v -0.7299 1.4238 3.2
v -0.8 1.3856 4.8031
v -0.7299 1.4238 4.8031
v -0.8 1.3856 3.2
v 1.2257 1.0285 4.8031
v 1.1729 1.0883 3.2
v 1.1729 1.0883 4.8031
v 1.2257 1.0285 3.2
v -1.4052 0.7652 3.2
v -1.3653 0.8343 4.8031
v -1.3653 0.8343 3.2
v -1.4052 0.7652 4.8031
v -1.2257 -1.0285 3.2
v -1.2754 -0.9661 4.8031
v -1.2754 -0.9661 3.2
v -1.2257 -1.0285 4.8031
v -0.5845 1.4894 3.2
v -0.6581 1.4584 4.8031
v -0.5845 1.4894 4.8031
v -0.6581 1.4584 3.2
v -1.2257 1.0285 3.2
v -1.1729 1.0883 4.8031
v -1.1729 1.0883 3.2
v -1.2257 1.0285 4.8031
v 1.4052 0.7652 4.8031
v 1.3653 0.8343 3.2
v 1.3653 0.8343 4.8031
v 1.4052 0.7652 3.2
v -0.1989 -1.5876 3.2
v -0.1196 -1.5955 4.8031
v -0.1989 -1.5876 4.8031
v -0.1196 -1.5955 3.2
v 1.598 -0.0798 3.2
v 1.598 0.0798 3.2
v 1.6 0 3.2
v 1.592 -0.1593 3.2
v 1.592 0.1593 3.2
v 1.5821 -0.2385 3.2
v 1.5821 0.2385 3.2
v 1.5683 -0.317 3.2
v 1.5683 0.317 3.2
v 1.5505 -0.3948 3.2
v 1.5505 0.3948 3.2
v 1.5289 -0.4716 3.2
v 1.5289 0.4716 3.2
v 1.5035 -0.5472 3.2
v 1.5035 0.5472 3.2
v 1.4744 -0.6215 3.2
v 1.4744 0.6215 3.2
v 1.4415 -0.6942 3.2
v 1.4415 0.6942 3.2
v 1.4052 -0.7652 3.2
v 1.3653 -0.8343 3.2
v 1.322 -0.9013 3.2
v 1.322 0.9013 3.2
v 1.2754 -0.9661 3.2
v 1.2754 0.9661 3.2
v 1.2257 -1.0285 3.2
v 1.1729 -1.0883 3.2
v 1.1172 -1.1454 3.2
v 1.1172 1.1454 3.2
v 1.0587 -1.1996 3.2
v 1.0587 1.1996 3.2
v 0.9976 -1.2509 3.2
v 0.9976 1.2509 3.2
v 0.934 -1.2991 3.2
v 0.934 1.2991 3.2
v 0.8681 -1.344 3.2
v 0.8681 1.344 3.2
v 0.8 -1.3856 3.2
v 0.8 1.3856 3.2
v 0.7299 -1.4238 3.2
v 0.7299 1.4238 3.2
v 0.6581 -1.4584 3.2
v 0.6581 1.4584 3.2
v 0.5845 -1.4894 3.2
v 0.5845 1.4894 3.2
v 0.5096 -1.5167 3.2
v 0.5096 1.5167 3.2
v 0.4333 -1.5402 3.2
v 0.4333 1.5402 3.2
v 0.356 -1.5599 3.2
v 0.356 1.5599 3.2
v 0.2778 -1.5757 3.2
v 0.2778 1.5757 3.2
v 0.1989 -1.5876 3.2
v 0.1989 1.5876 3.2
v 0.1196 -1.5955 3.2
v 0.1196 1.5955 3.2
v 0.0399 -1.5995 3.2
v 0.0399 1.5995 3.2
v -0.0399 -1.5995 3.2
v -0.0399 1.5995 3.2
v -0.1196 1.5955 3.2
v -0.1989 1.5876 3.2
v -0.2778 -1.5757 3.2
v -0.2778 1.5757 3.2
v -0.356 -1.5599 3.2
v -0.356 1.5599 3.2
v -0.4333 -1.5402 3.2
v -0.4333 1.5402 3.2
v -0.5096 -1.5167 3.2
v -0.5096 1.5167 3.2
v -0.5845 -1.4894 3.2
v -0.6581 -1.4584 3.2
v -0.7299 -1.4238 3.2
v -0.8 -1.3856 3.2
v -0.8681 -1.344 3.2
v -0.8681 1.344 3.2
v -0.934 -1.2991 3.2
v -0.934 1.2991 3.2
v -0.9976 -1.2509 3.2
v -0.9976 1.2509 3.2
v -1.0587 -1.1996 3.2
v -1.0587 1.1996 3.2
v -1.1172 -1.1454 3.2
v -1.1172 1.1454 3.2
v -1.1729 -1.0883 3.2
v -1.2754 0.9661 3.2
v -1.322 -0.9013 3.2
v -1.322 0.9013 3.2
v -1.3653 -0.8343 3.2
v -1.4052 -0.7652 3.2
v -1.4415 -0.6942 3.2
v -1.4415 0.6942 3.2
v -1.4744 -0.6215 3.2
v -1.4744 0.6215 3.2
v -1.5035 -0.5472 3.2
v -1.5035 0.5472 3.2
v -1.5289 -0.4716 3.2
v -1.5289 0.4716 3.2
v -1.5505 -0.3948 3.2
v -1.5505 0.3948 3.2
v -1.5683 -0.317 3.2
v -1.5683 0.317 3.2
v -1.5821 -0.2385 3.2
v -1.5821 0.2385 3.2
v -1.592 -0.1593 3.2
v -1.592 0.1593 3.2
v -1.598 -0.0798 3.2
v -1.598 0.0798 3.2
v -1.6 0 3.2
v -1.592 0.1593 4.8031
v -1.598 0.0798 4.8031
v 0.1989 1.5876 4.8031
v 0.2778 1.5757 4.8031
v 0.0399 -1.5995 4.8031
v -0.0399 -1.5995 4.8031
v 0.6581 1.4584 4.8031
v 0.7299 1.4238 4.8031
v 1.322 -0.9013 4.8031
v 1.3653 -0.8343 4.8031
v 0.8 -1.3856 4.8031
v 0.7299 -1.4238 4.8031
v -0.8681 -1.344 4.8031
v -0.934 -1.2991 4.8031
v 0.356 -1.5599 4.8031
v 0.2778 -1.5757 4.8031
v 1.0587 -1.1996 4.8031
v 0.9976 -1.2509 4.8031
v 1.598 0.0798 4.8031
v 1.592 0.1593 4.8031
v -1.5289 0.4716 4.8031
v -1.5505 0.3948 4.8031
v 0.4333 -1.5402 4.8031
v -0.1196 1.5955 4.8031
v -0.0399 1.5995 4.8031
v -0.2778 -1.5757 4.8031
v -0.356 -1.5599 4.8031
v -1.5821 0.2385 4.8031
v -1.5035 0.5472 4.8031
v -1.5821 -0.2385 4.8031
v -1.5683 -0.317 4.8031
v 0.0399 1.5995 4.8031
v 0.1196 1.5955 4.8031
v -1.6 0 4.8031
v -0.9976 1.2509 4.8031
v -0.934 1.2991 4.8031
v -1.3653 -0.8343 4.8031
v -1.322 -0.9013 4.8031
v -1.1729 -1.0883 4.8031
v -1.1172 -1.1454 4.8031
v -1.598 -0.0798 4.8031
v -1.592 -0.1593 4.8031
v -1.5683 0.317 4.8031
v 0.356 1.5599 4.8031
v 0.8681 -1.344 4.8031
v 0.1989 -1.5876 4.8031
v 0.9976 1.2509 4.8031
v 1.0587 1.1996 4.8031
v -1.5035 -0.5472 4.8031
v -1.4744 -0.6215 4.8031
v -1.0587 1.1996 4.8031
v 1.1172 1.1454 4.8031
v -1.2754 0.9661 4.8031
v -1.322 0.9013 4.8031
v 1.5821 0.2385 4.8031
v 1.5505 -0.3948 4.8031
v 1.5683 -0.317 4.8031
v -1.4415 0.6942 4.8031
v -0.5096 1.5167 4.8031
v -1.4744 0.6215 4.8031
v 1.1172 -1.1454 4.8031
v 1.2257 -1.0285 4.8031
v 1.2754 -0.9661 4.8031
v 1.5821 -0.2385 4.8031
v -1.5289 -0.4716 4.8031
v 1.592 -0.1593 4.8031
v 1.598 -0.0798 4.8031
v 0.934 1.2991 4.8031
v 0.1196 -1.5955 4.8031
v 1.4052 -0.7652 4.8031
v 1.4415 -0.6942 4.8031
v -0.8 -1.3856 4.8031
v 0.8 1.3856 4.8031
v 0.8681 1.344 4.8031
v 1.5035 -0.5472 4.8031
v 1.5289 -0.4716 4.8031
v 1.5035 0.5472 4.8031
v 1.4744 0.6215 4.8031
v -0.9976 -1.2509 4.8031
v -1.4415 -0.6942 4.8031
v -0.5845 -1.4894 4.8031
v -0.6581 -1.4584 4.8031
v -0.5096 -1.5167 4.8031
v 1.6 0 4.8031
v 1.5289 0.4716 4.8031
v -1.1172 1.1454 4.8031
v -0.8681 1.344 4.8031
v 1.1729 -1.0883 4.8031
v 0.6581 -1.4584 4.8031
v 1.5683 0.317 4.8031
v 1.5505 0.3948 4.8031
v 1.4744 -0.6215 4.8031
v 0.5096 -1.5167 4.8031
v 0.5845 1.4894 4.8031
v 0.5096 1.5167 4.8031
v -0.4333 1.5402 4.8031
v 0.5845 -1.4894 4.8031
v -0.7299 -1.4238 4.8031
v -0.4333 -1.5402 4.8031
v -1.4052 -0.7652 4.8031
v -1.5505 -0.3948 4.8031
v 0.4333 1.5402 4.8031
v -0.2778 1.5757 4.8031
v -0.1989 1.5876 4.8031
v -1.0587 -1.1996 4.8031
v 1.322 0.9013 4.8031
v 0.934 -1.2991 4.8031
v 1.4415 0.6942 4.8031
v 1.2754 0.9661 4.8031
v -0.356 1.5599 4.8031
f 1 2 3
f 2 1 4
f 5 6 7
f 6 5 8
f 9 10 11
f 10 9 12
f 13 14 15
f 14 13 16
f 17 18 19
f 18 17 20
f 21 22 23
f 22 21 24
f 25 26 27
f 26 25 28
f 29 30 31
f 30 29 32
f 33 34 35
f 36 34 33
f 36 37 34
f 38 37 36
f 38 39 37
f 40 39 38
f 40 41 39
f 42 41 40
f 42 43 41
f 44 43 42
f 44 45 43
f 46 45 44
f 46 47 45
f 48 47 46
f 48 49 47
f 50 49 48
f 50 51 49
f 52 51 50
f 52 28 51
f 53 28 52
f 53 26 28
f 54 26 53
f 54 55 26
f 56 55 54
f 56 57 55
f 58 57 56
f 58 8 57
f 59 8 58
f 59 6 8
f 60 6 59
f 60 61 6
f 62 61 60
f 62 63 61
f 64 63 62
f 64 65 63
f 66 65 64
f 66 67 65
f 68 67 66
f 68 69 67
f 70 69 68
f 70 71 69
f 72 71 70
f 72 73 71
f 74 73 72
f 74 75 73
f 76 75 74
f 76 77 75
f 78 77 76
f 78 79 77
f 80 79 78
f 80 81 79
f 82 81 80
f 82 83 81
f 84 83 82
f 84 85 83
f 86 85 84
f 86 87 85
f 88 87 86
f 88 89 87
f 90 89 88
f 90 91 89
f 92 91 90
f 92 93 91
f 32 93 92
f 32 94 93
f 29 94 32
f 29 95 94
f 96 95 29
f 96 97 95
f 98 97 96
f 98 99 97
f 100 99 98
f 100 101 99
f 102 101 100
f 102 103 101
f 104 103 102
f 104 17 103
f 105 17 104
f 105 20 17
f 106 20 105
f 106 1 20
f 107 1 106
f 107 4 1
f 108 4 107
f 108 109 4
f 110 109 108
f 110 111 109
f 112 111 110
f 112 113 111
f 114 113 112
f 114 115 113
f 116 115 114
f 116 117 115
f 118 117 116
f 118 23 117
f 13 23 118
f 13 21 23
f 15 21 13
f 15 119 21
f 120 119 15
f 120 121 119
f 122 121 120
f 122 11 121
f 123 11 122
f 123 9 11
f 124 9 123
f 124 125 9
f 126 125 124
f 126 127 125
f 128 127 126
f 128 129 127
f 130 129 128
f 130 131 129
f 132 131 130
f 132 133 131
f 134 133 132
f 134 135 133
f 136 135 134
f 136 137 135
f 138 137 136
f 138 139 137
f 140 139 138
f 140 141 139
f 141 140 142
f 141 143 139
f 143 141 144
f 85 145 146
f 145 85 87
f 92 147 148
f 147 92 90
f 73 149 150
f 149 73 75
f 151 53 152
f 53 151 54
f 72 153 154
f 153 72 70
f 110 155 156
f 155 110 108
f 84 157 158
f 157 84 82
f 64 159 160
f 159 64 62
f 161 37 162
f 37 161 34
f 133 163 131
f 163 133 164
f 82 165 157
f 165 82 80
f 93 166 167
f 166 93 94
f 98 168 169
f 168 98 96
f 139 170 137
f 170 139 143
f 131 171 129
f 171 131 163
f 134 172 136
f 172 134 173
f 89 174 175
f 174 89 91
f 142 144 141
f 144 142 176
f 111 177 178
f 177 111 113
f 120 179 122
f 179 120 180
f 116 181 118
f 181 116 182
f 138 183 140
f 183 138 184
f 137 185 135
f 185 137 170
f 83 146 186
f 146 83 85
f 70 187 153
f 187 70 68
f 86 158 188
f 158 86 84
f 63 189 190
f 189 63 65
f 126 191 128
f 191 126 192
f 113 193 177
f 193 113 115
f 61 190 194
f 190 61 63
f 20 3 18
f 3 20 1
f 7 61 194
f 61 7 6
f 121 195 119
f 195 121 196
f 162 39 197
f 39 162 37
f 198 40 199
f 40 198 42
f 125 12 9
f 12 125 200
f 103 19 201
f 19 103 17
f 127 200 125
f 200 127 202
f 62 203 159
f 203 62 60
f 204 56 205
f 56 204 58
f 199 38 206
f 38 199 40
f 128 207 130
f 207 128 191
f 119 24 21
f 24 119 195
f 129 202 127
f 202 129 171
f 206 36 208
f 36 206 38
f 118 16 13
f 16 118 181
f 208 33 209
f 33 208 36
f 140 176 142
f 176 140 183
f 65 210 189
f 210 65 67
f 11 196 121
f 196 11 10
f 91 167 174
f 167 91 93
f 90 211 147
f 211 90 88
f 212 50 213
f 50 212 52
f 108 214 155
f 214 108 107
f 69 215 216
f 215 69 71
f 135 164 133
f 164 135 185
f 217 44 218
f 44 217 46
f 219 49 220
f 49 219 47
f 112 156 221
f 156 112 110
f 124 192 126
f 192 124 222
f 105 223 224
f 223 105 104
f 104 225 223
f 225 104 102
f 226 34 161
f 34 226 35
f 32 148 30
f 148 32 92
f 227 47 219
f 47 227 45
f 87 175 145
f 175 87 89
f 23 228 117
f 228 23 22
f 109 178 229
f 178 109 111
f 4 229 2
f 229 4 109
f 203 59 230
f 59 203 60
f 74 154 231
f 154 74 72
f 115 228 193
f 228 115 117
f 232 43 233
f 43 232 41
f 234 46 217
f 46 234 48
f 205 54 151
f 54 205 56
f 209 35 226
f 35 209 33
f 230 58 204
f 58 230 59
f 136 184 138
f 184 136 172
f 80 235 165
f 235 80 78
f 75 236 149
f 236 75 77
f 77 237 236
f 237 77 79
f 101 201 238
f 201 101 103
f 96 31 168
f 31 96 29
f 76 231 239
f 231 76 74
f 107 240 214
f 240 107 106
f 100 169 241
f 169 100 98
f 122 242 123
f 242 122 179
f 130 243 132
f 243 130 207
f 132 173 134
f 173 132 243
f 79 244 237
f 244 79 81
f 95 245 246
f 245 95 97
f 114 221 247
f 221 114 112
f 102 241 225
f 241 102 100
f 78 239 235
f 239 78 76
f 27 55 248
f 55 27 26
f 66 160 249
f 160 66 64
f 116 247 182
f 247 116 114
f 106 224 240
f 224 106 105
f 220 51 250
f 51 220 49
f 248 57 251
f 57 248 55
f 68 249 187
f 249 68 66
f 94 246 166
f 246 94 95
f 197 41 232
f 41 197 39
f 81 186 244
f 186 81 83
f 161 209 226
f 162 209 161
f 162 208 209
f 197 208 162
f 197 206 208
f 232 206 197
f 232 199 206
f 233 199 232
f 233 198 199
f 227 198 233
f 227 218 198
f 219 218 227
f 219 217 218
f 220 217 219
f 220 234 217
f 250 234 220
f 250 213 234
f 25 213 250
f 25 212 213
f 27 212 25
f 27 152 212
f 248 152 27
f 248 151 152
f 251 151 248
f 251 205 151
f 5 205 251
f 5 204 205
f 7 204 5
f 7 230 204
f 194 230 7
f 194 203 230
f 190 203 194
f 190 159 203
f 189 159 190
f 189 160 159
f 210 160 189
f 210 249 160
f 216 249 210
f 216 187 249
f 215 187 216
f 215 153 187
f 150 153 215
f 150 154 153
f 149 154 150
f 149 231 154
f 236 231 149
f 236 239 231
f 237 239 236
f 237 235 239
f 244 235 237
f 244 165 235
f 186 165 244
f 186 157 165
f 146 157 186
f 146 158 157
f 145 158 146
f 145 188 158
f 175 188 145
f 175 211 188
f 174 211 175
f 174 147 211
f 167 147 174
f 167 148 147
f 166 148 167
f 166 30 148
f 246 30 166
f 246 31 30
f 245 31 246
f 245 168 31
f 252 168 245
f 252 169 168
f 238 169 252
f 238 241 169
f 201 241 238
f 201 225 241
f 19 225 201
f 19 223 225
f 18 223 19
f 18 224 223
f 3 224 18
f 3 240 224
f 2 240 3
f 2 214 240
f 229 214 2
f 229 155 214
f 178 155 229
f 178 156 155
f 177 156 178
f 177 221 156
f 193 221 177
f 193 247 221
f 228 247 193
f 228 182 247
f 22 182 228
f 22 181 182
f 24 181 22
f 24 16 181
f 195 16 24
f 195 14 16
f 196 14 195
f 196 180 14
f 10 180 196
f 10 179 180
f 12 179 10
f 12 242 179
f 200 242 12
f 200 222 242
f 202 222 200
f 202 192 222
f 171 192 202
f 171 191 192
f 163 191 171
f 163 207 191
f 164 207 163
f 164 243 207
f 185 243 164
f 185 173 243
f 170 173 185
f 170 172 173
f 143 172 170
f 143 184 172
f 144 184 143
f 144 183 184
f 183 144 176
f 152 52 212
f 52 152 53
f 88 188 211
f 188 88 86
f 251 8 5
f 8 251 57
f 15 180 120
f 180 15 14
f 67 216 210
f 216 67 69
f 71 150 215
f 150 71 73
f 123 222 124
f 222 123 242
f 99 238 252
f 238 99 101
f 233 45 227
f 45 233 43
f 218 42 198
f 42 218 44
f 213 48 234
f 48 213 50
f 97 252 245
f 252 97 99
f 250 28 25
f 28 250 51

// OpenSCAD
use <../lib.scad>
use <../p/48/1-4cyli.scad>
use <s/93273s01.scad>
$fa=1; $fs=0.2;
function ldraw_lib__93273(realsolid=false) = [
// 0 Slope Brick Curved  4 x  1 Double
// 0 Name: 93273.dat
// 0 Author: Magnus Forsberg [MagFors]
// 0 !LDRAW_ORG Part UPDATE 2011-02
// 0 !LICENSE Licensed under CC BY 2.0 and CC BY 4.0 : see CAreadme.txt
// 
// 0 BFC CERTIFY CCW
  [0,"BFC","CERTIFY"],
  [0,"BFC","CCW"],
// 
// 0 !HISTORY 2011-12-29 [PTadmin] Official Update 2011-02
// 
// 
// 1 16 0 0 0 1 0 0 0 1 0 0 0 1 s\93273s01.dat
  [1,16,0,0,0,1,0,0,0,1,0,0,0,1, ldraw_lib__s__93273s01(realsolid)],
// 1 16 -10 24.9719 0 0 20 0 -28.9719 0 -28.9719 40 0 -40 48\1-4cyli.dat
  [1,16,-10,24.9719,0,0,20,0,-28.9719,0,-28.9719,40,0,-40, ldraw_lib__48__1_4cyli(realsolid)],
];
module ldraw_lib__93273(step=0, col=false, unit=2/5, alt=false, line=0.2, solid=!$preview)
    makepoly(ldraw_lib__93273(solid), step=step, col=col, unit=unit, alt=alt, line=line, solid=solid);
ldraw_lib__93273(line=0.2);
